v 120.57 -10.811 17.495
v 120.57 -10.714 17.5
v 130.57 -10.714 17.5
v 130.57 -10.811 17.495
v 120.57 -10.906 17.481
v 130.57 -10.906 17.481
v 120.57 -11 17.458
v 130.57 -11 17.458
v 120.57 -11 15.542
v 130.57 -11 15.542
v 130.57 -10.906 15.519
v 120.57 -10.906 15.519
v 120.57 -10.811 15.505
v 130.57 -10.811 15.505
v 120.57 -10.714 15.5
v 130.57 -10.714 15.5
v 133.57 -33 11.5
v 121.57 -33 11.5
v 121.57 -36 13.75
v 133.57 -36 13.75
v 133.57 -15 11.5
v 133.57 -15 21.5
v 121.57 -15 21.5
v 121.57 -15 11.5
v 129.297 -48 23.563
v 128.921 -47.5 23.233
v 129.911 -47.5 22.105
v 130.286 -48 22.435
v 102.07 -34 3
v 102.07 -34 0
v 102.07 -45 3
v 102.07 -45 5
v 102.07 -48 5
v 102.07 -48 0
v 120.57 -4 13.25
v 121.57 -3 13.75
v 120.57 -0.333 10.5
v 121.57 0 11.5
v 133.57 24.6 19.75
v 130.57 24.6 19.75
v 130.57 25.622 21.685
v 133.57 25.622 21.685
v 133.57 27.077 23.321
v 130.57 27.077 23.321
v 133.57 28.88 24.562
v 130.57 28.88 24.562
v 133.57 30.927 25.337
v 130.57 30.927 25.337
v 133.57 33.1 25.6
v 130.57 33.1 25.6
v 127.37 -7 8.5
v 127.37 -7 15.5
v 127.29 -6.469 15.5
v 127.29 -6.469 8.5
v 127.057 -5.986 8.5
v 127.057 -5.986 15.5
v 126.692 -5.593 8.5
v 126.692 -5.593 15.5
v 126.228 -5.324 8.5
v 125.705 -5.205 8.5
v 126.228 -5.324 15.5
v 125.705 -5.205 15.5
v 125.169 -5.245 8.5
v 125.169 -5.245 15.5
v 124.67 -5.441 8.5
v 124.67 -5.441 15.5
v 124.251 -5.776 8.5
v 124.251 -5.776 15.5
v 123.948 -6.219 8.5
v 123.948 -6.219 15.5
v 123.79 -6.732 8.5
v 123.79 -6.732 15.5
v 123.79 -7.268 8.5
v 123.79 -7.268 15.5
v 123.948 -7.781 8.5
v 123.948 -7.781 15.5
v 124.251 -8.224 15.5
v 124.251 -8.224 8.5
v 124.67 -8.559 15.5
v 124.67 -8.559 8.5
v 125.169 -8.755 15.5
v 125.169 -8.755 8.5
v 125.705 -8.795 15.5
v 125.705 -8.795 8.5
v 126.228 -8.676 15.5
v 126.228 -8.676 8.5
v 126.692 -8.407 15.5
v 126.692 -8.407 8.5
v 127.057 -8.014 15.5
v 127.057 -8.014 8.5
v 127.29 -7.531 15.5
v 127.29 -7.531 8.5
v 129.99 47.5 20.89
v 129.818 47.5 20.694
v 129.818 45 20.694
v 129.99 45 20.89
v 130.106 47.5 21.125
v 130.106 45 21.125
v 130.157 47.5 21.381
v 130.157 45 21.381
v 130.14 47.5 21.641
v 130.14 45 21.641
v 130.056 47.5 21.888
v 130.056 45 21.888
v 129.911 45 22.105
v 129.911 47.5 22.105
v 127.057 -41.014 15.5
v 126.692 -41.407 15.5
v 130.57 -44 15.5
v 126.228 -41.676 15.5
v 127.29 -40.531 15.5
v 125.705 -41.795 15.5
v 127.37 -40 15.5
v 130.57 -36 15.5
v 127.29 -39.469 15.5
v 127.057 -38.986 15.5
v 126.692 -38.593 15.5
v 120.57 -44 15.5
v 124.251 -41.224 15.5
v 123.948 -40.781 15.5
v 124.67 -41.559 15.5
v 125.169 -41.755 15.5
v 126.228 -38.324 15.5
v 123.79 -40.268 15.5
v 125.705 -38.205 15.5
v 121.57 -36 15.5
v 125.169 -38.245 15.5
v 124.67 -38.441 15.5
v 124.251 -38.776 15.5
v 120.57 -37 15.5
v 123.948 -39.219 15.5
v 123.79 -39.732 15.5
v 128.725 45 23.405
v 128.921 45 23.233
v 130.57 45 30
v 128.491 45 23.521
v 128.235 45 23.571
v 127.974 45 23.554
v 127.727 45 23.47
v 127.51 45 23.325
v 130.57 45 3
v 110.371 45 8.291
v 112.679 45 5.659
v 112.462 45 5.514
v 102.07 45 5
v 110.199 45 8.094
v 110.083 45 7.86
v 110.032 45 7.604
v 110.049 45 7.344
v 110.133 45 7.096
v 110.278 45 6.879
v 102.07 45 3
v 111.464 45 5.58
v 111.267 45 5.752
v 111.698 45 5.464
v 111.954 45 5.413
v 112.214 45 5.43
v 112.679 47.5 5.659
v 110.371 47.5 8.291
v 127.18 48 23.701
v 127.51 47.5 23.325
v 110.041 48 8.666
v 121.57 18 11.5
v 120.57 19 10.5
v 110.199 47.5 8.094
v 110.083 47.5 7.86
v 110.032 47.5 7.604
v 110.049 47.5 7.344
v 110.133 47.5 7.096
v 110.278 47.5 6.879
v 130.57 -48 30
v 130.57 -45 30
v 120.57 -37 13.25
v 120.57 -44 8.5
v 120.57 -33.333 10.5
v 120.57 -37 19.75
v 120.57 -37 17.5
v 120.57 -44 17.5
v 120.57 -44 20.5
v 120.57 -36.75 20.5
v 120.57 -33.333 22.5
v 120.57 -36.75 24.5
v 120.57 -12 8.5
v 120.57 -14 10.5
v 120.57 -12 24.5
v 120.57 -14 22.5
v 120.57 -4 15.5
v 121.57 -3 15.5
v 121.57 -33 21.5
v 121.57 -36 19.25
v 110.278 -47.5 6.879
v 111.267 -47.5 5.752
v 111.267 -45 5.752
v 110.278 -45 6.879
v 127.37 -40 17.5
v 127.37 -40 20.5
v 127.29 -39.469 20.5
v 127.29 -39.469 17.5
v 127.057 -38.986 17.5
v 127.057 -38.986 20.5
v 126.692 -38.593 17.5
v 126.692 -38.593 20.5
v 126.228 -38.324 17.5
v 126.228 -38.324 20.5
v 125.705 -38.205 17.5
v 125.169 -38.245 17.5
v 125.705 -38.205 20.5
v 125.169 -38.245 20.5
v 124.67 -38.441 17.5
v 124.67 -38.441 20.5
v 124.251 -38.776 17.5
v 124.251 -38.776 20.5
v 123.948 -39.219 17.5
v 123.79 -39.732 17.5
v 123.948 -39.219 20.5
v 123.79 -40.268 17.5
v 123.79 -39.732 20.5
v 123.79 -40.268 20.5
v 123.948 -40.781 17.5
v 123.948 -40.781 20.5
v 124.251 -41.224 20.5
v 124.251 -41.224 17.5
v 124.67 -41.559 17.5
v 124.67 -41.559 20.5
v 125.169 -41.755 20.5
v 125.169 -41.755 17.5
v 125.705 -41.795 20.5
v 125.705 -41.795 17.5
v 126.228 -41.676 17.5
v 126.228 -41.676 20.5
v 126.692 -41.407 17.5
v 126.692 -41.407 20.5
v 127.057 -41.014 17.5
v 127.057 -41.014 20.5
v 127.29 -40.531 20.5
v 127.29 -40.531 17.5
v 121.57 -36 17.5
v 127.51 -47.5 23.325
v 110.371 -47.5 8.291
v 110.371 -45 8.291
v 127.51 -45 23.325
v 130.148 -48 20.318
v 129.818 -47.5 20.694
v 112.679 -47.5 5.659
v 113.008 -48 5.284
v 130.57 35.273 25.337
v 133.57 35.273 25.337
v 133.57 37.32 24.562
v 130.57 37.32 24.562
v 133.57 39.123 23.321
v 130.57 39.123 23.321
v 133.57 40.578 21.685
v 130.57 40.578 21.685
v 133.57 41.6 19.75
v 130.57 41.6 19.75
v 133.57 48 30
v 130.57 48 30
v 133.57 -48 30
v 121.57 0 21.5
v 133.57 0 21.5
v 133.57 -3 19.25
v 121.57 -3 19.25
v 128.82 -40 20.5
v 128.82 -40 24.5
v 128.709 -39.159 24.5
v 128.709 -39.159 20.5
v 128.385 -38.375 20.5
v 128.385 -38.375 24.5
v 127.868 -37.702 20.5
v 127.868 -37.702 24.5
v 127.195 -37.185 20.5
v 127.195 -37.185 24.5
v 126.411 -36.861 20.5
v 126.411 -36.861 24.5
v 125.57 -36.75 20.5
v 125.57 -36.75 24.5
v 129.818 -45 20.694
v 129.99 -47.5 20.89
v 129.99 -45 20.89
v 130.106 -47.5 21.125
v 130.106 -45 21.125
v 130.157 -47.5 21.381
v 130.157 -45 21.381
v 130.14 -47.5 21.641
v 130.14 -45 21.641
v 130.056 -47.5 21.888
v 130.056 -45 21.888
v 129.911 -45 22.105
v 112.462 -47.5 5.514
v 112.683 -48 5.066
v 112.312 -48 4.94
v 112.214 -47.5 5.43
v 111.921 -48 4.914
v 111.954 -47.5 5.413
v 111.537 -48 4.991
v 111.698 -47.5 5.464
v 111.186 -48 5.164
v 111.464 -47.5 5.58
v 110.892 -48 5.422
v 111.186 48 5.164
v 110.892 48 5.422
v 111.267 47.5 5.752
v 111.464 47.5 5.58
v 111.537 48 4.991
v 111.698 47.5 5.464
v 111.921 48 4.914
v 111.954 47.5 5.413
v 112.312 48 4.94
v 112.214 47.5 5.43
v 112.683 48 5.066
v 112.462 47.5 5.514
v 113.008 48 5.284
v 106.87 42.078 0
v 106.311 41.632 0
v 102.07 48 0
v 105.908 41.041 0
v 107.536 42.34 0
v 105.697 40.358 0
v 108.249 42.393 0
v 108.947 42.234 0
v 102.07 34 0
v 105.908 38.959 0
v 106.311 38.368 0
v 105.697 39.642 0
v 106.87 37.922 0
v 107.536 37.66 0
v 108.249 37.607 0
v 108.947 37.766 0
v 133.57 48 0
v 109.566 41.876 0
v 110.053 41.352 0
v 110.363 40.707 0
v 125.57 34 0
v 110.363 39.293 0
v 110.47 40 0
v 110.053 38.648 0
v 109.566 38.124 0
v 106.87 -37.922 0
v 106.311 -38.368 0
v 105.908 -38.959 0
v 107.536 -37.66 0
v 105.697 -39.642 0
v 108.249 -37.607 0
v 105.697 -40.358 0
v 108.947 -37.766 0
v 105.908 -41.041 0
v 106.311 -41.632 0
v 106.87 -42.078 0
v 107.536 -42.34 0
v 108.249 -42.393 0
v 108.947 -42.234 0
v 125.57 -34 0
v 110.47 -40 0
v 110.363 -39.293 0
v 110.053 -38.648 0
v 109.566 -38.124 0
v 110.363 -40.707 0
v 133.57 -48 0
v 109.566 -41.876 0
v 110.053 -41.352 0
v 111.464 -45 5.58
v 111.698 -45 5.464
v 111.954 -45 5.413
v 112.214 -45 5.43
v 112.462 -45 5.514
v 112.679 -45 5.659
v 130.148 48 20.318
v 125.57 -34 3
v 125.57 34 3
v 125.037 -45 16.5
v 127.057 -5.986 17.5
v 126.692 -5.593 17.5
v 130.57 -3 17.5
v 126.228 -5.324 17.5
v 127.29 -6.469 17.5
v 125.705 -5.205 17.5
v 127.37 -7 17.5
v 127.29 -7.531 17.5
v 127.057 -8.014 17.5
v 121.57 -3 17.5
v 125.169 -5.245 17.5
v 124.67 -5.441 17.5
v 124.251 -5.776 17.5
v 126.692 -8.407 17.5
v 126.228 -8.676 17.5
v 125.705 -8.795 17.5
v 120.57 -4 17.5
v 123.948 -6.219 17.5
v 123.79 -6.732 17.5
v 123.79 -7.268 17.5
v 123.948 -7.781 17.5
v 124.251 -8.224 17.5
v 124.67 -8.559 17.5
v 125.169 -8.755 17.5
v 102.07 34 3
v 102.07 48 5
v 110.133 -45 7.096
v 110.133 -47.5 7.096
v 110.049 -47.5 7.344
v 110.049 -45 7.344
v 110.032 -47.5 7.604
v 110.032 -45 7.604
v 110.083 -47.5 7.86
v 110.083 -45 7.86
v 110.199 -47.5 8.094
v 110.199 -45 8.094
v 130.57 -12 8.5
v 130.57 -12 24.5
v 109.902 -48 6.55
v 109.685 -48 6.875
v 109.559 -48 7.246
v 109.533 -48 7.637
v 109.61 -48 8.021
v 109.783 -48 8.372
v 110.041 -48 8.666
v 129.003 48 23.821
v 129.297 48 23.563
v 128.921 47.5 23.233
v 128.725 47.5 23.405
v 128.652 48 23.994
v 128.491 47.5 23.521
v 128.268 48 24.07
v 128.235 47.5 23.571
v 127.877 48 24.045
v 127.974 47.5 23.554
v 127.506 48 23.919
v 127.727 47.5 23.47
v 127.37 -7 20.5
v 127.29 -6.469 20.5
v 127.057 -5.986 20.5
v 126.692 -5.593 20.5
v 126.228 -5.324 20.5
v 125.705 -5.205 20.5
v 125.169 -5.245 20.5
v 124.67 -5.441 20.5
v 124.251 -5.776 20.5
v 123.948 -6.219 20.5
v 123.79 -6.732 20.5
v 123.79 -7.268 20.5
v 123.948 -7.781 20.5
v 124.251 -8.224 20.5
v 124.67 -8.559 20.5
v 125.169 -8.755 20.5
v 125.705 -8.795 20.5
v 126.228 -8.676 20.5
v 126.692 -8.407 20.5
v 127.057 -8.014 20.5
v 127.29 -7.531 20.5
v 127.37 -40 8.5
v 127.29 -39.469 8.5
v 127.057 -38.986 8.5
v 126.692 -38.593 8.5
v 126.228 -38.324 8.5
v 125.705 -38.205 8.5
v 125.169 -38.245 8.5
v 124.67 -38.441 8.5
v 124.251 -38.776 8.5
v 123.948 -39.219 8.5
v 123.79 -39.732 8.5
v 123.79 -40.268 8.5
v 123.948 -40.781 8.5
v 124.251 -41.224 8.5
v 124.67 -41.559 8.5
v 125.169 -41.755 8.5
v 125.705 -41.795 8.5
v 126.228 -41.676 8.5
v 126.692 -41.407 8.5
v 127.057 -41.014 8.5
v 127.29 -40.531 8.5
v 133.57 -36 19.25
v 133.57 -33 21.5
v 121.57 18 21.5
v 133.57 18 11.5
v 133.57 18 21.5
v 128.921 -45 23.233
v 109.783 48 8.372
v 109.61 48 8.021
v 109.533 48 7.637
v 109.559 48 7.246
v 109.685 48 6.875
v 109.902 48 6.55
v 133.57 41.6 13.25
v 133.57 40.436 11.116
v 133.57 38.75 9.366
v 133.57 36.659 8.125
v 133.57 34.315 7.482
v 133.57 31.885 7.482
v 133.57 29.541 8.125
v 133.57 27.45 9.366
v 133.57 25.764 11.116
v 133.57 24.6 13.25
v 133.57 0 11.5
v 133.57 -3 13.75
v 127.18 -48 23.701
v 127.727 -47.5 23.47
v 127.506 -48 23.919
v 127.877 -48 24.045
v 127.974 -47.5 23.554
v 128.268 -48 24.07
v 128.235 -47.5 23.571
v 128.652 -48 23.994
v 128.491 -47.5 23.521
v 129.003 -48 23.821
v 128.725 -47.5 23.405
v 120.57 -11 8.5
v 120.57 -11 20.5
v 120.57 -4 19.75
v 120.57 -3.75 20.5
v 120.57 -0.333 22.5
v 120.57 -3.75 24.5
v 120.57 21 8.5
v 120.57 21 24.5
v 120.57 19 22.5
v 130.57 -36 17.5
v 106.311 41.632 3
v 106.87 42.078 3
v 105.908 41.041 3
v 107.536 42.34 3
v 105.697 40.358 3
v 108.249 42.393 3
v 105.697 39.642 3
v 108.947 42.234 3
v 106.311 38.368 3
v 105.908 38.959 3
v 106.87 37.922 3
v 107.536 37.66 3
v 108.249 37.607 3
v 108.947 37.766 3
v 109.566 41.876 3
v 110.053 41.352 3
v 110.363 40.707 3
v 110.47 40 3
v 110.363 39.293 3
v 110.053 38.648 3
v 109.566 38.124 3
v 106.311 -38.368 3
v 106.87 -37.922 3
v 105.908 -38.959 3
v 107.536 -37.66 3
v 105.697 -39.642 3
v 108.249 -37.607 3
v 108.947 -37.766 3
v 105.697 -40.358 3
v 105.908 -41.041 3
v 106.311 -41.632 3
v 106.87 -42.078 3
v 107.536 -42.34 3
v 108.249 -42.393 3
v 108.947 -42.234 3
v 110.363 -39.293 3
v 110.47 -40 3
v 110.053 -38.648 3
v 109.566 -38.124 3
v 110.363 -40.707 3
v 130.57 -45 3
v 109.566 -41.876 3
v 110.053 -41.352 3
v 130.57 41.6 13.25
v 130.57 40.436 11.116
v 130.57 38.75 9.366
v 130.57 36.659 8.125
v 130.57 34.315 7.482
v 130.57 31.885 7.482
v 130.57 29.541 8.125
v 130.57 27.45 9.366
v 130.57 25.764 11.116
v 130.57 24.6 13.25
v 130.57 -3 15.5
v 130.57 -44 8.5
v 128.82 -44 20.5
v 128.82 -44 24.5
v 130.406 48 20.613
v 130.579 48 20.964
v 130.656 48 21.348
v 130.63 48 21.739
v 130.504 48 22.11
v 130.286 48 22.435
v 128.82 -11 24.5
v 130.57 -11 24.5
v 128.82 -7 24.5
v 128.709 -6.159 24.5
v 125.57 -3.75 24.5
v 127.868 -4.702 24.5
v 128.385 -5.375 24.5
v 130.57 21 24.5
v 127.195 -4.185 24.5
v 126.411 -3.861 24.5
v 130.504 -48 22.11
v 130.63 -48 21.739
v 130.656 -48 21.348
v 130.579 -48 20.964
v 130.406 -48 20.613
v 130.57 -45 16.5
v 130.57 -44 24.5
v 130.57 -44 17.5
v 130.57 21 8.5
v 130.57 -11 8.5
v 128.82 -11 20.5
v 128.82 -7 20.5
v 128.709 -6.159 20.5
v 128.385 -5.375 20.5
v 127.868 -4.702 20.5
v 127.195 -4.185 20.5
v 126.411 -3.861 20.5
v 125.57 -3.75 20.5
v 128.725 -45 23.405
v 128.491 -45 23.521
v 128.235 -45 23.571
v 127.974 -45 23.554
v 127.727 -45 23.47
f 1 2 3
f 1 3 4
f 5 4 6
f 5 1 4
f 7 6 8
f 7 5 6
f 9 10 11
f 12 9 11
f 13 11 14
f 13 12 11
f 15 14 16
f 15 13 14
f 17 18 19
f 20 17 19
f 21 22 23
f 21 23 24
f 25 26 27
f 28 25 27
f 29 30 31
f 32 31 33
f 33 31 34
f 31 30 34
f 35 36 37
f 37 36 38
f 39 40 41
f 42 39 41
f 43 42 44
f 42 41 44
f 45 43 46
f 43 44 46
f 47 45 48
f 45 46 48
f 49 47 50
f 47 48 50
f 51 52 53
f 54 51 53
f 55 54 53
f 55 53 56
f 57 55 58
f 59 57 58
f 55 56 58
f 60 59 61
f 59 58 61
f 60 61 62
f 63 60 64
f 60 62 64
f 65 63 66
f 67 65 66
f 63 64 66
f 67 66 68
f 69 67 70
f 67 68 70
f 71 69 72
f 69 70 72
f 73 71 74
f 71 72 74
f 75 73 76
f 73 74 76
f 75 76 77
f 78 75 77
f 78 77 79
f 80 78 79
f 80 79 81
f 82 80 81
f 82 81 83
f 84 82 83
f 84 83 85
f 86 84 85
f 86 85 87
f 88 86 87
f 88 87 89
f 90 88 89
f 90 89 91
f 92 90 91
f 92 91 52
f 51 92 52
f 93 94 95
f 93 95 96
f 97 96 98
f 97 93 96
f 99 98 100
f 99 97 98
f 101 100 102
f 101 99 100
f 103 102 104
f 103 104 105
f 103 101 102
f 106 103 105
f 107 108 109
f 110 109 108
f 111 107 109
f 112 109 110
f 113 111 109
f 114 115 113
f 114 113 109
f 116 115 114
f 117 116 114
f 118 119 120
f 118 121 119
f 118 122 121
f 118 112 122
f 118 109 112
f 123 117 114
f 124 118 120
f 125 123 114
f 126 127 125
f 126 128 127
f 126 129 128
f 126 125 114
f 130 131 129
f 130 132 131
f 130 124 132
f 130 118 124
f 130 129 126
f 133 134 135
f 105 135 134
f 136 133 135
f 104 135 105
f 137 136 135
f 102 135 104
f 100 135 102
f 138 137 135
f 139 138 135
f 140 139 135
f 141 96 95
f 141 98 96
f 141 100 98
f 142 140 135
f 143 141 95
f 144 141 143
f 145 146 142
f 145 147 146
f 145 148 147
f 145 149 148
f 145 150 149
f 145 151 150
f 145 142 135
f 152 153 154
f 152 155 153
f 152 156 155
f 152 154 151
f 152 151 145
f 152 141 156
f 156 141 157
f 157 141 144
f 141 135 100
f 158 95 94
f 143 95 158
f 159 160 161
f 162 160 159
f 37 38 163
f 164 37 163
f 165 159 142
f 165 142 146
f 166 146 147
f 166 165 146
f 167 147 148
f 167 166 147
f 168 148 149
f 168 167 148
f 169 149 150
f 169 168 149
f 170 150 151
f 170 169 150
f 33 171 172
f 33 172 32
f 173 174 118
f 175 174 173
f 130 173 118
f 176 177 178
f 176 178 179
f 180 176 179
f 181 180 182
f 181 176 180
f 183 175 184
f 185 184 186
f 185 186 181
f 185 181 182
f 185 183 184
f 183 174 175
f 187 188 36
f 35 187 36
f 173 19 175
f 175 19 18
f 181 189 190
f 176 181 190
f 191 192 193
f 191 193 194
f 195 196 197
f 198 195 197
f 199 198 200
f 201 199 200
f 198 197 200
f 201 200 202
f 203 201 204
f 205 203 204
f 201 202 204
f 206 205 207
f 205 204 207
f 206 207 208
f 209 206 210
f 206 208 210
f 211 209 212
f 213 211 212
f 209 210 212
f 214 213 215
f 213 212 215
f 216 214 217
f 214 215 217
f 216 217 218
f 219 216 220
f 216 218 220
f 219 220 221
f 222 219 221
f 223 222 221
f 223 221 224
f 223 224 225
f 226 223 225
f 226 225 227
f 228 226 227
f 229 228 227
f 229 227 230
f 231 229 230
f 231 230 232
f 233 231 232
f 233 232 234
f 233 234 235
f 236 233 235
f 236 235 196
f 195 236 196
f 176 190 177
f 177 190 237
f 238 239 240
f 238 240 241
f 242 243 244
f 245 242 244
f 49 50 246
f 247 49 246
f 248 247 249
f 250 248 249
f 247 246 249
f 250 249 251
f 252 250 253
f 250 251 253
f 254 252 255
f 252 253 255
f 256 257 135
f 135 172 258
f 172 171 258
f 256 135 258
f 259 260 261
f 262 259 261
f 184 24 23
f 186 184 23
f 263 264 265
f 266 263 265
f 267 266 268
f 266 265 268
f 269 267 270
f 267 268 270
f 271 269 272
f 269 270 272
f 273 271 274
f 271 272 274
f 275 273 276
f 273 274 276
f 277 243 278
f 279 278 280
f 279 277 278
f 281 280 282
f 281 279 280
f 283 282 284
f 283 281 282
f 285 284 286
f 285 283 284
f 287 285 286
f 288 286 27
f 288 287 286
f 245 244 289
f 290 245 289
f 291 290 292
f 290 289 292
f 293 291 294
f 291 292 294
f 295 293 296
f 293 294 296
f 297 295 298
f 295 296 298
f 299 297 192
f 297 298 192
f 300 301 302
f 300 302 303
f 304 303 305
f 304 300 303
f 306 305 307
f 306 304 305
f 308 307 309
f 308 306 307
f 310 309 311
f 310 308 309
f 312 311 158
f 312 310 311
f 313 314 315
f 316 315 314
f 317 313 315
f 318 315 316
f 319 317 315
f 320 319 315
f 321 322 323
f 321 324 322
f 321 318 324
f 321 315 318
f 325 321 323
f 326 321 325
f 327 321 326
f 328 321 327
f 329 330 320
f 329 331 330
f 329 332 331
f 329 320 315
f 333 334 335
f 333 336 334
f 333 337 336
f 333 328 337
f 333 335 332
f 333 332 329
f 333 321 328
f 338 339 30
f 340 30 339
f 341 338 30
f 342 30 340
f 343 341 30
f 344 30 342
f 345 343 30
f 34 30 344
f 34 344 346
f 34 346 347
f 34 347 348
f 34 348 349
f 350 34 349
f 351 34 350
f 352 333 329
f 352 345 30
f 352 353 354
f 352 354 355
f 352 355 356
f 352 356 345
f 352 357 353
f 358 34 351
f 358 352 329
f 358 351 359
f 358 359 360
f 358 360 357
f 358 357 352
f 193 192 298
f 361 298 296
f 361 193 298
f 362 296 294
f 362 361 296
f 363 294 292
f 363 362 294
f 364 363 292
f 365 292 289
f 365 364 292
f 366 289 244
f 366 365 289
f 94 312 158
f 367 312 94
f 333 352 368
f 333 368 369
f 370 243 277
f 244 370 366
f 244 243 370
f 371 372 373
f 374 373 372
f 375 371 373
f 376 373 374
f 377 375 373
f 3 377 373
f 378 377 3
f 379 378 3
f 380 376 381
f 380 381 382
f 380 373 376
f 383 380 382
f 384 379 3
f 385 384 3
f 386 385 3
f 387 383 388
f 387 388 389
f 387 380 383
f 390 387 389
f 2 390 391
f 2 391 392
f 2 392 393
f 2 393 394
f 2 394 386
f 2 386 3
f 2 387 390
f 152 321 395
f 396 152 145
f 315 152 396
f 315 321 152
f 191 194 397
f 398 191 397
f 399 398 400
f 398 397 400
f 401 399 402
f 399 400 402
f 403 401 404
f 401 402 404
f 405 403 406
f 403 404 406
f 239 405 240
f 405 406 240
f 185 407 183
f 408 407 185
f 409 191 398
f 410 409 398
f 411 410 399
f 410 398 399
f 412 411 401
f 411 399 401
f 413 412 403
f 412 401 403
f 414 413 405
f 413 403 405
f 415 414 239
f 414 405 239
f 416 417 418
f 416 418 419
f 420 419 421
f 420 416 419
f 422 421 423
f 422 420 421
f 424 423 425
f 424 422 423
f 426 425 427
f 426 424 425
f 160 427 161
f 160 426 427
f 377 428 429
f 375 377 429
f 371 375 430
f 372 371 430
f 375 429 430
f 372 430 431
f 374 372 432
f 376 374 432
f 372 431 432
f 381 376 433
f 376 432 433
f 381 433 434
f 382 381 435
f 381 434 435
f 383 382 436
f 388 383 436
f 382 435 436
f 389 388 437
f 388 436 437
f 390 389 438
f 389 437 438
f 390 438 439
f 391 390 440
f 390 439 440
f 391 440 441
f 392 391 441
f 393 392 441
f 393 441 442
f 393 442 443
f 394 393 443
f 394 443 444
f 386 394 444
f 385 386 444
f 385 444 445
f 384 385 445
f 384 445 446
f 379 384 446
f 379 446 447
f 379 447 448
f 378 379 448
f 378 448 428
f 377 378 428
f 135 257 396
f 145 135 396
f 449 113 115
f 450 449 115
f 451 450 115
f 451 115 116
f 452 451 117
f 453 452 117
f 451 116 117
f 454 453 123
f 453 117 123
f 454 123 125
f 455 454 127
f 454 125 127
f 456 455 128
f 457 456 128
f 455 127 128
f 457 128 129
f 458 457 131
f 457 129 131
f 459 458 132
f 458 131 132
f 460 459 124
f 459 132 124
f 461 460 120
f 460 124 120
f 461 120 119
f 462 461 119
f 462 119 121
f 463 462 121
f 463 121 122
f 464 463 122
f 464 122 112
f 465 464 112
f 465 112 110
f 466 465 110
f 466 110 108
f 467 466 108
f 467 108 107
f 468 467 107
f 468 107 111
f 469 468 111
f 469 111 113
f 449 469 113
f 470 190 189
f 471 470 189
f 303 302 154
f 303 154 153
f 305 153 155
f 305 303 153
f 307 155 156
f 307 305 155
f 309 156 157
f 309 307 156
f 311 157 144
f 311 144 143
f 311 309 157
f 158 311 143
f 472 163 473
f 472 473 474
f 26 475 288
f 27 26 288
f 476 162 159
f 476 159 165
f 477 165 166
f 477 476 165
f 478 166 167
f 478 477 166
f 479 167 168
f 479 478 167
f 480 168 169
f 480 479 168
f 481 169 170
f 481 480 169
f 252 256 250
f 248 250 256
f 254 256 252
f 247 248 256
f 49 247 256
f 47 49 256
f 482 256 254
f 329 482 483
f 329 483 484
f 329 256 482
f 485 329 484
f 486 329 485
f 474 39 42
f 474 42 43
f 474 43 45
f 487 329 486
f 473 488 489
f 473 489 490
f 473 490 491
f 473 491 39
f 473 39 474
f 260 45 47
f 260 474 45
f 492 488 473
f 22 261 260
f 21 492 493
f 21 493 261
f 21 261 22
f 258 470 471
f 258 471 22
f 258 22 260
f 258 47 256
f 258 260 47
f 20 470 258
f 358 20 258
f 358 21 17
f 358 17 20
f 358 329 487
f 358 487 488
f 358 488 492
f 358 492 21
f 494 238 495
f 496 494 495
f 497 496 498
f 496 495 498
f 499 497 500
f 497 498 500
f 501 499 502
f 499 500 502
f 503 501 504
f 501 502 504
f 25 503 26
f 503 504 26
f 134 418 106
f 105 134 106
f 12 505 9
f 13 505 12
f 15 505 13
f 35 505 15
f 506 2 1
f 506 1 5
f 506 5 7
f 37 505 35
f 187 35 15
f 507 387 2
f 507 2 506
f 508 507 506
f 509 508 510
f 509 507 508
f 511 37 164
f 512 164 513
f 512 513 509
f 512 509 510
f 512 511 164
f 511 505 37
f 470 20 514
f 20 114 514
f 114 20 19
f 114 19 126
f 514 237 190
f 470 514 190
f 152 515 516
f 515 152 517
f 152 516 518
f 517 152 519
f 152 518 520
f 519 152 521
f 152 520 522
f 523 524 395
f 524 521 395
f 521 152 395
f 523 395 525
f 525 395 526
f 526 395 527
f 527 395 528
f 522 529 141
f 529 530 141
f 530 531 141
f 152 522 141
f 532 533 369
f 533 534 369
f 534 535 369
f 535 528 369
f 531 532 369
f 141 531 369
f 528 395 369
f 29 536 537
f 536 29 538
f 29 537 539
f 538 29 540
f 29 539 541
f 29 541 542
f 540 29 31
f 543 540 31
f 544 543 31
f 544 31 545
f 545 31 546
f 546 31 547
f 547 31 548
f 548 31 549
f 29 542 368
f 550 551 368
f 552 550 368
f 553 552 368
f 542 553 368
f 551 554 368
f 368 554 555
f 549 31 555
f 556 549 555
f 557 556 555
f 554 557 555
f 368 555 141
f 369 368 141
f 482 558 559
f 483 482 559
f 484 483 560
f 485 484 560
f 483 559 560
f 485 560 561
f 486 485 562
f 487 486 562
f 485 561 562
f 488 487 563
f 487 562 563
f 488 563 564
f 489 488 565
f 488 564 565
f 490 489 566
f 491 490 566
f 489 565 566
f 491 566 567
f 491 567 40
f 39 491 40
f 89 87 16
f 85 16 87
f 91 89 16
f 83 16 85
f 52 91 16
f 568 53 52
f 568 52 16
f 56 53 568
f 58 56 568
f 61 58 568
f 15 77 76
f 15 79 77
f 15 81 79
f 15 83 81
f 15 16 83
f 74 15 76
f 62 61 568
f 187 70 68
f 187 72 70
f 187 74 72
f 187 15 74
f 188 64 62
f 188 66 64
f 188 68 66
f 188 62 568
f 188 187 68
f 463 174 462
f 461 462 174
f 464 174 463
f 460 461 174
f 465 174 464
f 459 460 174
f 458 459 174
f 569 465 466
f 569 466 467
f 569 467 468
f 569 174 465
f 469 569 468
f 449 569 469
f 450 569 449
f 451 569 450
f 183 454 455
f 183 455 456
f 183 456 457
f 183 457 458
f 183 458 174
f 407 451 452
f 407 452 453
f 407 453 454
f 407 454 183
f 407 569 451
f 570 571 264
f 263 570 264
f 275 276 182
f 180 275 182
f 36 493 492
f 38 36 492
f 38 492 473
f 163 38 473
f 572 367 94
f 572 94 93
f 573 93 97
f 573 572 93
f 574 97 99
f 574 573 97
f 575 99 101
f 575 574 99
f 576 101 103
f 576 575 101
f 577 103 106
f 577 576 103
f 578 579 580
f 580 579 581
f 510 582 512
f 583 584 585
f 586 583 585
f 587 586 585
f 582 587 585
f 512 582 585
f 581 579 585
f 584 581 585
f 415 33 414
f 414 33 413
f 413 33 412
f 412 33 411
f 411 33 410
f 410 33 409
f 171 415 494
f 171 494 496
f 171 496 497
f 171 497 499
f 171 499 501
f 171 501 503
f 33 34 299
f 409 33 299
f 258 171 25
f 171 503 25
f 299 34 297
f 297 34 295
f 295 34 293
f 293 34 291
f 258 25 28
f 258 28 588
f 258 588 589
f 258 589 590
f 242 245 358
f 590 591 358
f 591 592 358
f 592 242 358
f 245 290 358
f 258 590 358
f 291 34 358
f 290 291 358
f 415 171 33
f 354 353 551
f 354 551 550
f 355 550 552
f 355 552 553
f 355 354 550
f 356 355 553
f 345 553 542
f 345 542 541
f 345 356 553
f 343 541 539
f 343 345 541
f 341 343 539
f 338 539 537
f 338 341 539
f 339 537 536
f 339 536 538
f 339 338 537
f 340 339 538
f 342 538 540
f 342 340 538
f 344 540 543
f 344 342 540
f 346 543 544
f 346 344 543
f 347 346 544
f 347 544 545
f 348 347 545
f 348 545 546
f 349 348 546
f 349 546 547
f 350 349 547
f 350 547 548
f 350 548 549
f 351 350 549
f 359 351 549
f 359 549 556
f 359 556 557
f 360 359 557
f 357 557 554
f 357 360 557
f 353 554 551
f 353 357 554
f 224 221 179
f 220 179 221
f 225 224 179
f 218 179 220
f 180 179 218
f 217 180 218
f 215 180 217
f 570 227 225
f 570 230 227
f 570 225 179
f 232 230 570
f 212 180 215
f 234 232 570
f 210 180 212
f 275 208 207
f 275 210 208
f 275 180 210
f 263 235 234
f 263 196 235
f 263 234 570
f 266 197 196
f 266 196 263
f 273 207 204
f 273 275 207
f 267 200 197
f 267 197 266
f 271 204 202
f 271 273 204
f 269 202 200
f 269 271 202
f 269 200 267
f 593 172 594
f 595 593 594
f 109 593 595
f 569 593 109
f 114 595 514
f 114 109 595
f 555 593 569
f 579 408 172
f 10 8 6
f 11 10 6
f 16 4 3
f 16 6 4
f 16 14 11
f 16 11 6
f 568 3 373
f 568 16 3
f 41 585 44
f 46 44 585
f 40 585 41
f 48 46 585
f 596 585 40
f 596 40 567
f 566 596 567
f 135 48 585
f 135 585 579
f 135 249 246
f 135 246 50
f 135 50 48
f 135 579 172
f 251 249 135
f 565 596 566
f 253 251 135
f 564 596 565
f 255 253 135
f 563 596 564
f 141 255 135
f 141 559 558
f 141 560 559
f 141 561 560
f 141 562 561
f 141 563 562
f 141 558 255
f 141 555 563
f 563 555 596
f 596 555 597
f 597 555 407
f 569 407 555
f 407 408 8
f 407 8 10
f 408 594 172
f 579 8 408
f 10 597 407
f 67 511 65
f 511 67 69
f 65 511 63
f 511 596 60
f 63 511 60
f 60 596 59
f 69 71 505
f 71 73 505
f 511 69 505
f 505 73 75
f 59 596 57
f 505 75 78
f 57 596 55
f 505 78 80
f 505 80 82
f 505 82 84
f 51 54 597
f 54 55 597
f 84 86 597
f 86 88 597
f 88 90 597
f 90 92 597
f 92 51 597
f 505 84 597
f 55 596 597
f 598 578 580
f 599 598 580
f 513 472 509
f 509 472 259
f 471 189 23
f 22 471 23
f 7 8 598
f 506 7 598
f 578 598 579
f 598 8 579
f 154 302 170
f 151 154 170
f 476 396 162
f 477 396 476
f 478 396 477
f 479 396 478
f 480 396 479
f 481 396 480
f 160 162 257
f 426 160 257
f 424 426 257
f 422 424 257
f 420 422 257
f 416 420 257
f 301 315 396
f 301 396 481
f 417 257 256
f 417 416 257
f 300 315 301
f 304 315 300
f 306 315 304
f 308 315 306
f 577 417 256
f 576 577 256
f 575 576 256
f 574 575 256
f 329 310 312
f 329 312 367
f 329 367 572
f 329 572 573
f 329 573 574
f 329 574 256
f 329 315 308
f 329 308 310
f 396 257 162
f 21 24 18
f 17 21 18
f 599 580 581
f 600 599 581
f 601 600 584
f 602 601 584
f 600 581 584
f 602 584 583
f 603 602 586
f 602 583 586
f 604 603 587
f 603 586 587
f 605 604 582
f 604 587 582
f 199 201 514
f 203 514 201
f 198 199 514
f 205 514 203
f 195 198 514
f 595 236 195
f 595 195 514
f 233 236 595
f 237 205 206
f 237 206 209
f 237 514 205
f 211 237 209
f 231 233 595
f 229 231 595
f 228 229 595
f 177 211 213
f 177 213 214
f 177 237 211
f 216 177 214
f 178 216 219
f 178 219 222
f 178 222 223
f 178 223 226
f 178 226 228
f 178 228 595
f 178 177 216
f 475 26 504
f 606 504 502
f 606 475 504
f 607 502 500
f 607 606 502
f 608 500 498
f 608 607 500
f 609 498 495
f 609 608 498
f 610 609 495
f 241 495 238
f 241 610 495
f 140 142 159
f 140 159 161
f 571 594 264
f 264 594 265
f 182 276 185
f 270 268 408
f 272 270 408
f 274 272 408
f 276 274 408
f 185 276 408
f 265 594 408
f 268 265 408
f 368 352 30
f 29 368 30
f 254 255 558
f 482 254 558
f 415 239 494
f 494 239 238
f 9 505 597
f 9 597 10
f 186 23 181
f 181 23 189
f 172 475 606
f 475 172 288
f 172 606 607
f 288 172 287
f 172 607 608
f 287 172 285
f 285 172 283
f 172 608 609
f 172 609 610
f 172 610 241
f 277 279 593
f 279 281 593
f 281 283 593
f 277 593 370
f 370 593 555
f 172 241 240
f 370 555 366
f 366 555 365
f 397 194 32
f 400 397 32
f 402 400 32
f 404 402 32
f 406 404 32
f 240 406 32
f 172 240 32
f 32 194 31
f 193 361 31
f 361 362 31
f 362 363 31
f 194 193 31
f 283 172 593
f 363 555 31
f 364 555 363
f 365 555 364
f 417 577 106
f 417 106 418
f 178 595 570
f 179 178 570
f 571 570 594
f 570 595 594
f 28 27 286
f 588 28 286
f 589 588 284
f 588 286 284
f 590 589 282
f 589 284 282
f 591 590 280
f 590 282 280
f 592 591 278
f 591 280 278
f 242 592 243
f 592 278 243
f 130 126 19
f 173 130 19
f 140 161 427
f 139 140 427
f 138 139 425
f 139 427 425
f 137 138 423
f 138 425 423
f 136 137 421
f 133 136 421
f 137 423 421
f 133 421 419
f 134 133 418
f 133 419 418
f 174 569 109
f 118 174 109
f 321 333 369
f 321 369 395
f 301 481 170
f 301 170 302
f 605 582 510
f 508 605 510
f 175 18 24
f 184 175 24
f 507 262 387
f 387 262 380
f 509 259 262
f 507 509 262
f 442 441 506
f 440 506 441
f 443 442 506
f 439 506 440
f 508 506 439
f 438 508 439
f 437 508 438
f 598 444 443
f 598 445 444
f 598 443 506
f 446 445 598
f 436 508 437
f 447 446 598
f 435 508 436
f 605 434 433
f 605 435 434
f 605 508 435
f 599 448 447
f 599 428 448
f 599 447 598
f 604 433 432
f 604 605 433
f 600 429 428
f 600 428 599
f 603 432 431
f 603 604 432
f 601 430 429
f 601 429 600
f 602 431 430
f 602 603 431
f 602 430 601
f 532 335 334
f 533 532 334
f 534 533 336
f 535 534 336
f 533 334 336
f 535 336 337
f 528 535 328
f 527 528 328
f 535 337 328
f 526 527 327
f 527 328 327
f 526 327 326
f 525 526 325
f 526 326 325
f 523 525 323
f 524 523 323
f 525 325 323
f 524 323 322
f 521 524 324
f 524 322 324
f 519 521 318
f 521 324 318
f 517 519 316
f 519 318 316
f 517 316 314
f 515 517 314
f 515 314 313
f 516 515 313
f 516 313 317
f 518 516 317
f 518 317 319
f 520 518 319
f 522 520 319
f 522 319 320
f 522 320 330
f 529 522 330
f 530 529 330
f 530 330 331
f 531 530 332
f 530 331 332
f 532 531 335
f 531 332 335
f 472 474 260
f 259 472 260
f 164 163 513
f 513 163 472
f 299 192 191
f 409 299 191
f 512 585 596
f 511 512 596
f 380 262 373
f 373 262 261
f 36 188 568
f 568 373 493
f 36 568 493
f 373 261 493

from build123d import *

# Parameters (mm, degrees)
SKETCH4_R           = 2.4
BOSS_EXTRUDE4_DEPTH = 3
BOSS_EXTRUDE5_DEPTH = 30
CUT_EXTRUDE2_START  = -3
CUT_EXTRUDE2_DEPTH  = 148.103937837
SOCKETHOLES_DEPTH   = 3
CUT_EXTRUDE4_DEPTH  = 110
FILLET1_R           = 1
CHAMFER1_SIZE       = 0.5
SKETCH14_W          = 16
SKETCH14_H          = 32
BOSS_EXTRUDE6_DEPTH = 10
CUT_EXTRUDE5_DEPTH  = 10
CHAMFER2_SIZE       = 1
SKETCH18_R          = 1.8
CUT_EXTRUDE7_DEPTH  = 17
SKETCH19_R          = 1.8
CUT_EXTRUDE8_DEPTH  = 4


with BuildPart() as part:
    # Sketch4 → Boss-Extrude4 (new body)
    with BuildSketch(Plane.XY):
        Polygon((130.57, 0), (125.57, 0), (125.57, -34), (102.07, -34), (102.07, -45), (130.57, -45), align=None)
        with Locations((108.07, -40)):
            Circle(SKETCH4_R, mode=Mode.SUBTRACT)
    boss_extrude4 = extrude(amount=BOSS_EXTRUDE4_DEPTH)

    # Sketch4<10> → Boss-Extrude5 (add)
    with BuildSketch(Plane.XY):
        Polygon((133.57, 0), (130.57, 0), (130.57, -45), (102.07, -45), (102.07, -48), (121.666903009, -48), (133.57, -48), align=None)
    boss_extrude5 = extrude(amount=BOSS_EXTRUDE5_DEPTH)

    # Sketch11 → Cut-Extrude2 (cut)
    with BuildSketch(Plane(origin=(0, -45, 0), x_dir=(1, 0, 0), z_dir=(0, 1, 0)).offset(CUT_EXTRUDE2_START)):
        Polygon((102.07, -30), (130.57, -30), (102.07, -5), align=None)
    cut_extrude2 = extrude(amount=CUT_EXTRUDE2_DEPTH, mode=Mode.SUBTRACT)

    # Mirror2: Boss-Extrude4, Boss-Extrude5, Cut-Extrude2 across plane
    add(boss_extrude4.mirror(Plane.ZX))
    add(boss_extrude5.mirror(Plane.ZX))
    add(cut_extrude2.mirror(Plane.ZX), mode=Mode.SUBTRACT)

    # Socket holes → socketholes (cut)
    with BuildSketch(Plane.ZY.offset(-130.57)):
        Polygon((21.5, -33), (21.5, -15), (11.5, -15), (11.5, -33), (13.75, -36), (19.25, -36), align=None)
        with BuildLine():
            Line((19.749615362, 41.6), (13.250384638, 41.6))
            ThreePointArc((13.250384638, 41.6), (7.4, 33.1), (13.250384638, 24.6))
            Line((13.250384638, 24.6), (19.749615362, 24.6))
            ThreePointArc((19.749615362, 24.6), (23.996048952, 27.940615337), (25.6, 33.1))
            ThreePointArc((25.6, 33.1), (23.996048952, 38.259384663), (19.749615362, 41.6))
        make_face()
        Polygon((21.5, 18), (11.5, 18), (11.5, 0), (13.75, -3), (19.25, -3), (21.5, 0), align=None)
    extrude(amount=-SOCKETHOLES_DEPTH, mode=Mode.SUBTRACT)

    # Sketch12 → Cut-Extrude4 (cut)
    with BuildSketch(Plane.XZ.offset(48)):
        Polygon((109.618848481, 7.631156895), (128.261967636, 23.984770189), (130.57, 21.353613294), (111.926880845, 5), align=None)
    extrude(amount=-CUT_EXTRUDE4_DEPTH, mode=Mode.SUBTRACT)

    # Fillet1
    fillet1_edges = [part.edges().sort_by_distance(p)[0] for p in [
        (111.926880845, 46.5, 5),
        (109.618848481, 46.5, 7.631156895),
        (128.261967636, 46.5, 23.984770189),
        (130.57, 46.5, 21.353613294),
        (111.926880845, -46.5, 5),
        (109.618848481, -46.5, 7.631156895),
        (128.261967636, -46.5, 23.984770189),
        (130.57, -46.5, 21.353613294),
    ]]
    fillet(fillet1_edges, radius=FILLET1_R)

    # Chamfer1
    chamfer1_edges = [part.edges().sort_by_distance(p)[0] for p in [
        (110.772864663, 48, 6.315578448),
        (118.940408059, 48, 15.807963542),
        (121.248440423, 48, 13.176806647),
        (129.415983818, 48, 22.669191741),
        (121.248440423, -48, 13.176806647),
        (110.772864663, -48, 6.315578448),
        (118.940408059, -48, 15.807963542),
        (129.415983818, -48, 22.669191741),
        (110.032178493, 48, 7.604116614),
        (111.953921127, 48, 5.413330012),
        (130.156669988, 48, 21.380653575),
        (128.234927355, 48, 23.571440177),
        (111.953921127, -48, 5.413330012),
        (110.032178493, -48, 7.604116614),
        (128.234927355, -48, 23.571440177),
        (130.156669988, -48, 21.380653575),
    ]]
    chamfer(chamfer1_edges, length=CHAMFER1_SIZE)

    # Sketch14 → Boss-Extrude6 (add)
    # profile 1 of 2: a face of its own
    with BuildSketch(Plane.ZY.offset(-130.57)):
        Polygon((8.5, 21), (8.5, -1), (8.5, -11), (24.5, -11), (24.5, -1), (24.5, 21), align=None)
        Polygon((11.5, 0), (11.5, 18), (21.5, 18), (21.5, 0), (19.25, -3), (13.75, -3), align=None, mode=Mode.SUBTRACT)
    # profile 2 of 2: a face of its own
    with BuildSketch(Plane.ZY.offset(-130.57)):
        with Locations((16.5, -28)):
            Rectangle(SKETCH14_W, SKETCH14_H)
        Polygon((21.5, -33), (19.25, -36), (13.75, -36), (11.5, -33), (11.5, -15), (21.5, -15), align=None, mode=Mode.SUBTRACT)
    extrude(amount=BOSS_EXTRUDE6_DEPTH)

    # Sketch15 → Cut-Extrude5 (cut)
    with BuildSketch(Plane.ZY.offset(-120.57)):
        with BuildLine():
            Line((17.5, -36), (17.5, -44))
            ThreePointArc((17.5, -44), (16.5, -45), (15.5, -44))
            Line((15.5, -44), (15.5, -36))
            ThreePointArc((15.5, -36), (16.5, -35), (17.5, -36))
        make_face()
        with BuildLine():
            Line((15.5, -10.714079148), (15.5, -2.714079148))
            ThreePointArc((15.5, -2.714079148), (16.5, -1.714079148), (17.5, -2.714079148))
            Line((17.5, -2.714079148), (17.5, -10.714079148))
            ThreePointArc((17.5, -10.714079148), (16.5, -11.714079148), (15.5, -10.714079148))
        make_face()
    extrude(amount=-CUT_EXTRUDE5_DEPTH, mode=Mode.SUBTRACT)

    # Chamfer2
    chamfer2_edges = [part.edges().sort_by_distance(p)[0] for p in [
        (120.57, -34.5, 12.625),
        (120.57, -24, 11.5),
        (120.57, -15, 16.5),
        (120.57, -24, 21.5),
        (120.57, -34.5, 20.375),
        (120.57, -36, 18.375),
        (120.57, 9, 21.5),
        (120.57, 18, 16.5),
        (120.57, 9, 11.5),
        (120.57, -1.5, 12.625),
        (120.57, -3, 14.625),
        (120.57, -1.5, 20.375),
        (120.57, -3, 18.375),
        (120.57, -36, 14.625),
    ]]
    chamfer(chamfer2_edges, length=CHAMFER2_SIZE)

    # Sketch18 → Cut-Extrude7 (cut)
    with BuildSketch(Plane.XY.offset(24.5)):
        with Locations((125.57, -40)):
            Circle(SKETCH18_R)
        with Locations((125.57, -7)):
            Circle(SKETCH18_R)
    extrude(amount=-CUT_EXTRUDE7_DEPTH, mode=Mode.SUBTRACT)

    # Sketch19 → Cut-Extrude8 (cut)
    # profile 1 of 2: a face of its own
    with BuildSketch(Plane.XY.offset(24.5)):
        with BuildLine():
            Line((128.82, -44), (128.82, -40))
            ThreePointArc((128.82, -40), (127.868097039, -37.701902961), (125.57, -36.75))
            Line((125.57, -36.75), (120.57, -36.75))
            Line((120.57, -36.75), (120.57, -44))
            Line((120.57, -44), (128.82, -44))
        make_face()
        with Locations((125.57, -40)):
            Circle(SKETCH19_R, mode=Mode.SUBTRACT)
    # profile 2 of 2: a face of its own
    with BuildSketch(Plane.XY.offset(24.5)):
        with BuildLine():
            ThreePointArc((128.82, -7), (127.868097039, -4.701902961), (125.57, -3.75))
            Line((125.57, -3.75), (120.57, -3.75))
            Line((120.57, -3.75), (120.57, -11))
            Line((120.57, -11), (128.82, -11))
            Line((128.82, -11), (128.82, -7))
        make_face()
        with Locations((125.57, -7)):
            Circle(SKETCH19_R, mode=Mode.SUBTRACT)
    extrude(amount=-CUT_EXTRUDE8_DEPTH, mode=Mode.SUBTRACT)


solid = part.part
